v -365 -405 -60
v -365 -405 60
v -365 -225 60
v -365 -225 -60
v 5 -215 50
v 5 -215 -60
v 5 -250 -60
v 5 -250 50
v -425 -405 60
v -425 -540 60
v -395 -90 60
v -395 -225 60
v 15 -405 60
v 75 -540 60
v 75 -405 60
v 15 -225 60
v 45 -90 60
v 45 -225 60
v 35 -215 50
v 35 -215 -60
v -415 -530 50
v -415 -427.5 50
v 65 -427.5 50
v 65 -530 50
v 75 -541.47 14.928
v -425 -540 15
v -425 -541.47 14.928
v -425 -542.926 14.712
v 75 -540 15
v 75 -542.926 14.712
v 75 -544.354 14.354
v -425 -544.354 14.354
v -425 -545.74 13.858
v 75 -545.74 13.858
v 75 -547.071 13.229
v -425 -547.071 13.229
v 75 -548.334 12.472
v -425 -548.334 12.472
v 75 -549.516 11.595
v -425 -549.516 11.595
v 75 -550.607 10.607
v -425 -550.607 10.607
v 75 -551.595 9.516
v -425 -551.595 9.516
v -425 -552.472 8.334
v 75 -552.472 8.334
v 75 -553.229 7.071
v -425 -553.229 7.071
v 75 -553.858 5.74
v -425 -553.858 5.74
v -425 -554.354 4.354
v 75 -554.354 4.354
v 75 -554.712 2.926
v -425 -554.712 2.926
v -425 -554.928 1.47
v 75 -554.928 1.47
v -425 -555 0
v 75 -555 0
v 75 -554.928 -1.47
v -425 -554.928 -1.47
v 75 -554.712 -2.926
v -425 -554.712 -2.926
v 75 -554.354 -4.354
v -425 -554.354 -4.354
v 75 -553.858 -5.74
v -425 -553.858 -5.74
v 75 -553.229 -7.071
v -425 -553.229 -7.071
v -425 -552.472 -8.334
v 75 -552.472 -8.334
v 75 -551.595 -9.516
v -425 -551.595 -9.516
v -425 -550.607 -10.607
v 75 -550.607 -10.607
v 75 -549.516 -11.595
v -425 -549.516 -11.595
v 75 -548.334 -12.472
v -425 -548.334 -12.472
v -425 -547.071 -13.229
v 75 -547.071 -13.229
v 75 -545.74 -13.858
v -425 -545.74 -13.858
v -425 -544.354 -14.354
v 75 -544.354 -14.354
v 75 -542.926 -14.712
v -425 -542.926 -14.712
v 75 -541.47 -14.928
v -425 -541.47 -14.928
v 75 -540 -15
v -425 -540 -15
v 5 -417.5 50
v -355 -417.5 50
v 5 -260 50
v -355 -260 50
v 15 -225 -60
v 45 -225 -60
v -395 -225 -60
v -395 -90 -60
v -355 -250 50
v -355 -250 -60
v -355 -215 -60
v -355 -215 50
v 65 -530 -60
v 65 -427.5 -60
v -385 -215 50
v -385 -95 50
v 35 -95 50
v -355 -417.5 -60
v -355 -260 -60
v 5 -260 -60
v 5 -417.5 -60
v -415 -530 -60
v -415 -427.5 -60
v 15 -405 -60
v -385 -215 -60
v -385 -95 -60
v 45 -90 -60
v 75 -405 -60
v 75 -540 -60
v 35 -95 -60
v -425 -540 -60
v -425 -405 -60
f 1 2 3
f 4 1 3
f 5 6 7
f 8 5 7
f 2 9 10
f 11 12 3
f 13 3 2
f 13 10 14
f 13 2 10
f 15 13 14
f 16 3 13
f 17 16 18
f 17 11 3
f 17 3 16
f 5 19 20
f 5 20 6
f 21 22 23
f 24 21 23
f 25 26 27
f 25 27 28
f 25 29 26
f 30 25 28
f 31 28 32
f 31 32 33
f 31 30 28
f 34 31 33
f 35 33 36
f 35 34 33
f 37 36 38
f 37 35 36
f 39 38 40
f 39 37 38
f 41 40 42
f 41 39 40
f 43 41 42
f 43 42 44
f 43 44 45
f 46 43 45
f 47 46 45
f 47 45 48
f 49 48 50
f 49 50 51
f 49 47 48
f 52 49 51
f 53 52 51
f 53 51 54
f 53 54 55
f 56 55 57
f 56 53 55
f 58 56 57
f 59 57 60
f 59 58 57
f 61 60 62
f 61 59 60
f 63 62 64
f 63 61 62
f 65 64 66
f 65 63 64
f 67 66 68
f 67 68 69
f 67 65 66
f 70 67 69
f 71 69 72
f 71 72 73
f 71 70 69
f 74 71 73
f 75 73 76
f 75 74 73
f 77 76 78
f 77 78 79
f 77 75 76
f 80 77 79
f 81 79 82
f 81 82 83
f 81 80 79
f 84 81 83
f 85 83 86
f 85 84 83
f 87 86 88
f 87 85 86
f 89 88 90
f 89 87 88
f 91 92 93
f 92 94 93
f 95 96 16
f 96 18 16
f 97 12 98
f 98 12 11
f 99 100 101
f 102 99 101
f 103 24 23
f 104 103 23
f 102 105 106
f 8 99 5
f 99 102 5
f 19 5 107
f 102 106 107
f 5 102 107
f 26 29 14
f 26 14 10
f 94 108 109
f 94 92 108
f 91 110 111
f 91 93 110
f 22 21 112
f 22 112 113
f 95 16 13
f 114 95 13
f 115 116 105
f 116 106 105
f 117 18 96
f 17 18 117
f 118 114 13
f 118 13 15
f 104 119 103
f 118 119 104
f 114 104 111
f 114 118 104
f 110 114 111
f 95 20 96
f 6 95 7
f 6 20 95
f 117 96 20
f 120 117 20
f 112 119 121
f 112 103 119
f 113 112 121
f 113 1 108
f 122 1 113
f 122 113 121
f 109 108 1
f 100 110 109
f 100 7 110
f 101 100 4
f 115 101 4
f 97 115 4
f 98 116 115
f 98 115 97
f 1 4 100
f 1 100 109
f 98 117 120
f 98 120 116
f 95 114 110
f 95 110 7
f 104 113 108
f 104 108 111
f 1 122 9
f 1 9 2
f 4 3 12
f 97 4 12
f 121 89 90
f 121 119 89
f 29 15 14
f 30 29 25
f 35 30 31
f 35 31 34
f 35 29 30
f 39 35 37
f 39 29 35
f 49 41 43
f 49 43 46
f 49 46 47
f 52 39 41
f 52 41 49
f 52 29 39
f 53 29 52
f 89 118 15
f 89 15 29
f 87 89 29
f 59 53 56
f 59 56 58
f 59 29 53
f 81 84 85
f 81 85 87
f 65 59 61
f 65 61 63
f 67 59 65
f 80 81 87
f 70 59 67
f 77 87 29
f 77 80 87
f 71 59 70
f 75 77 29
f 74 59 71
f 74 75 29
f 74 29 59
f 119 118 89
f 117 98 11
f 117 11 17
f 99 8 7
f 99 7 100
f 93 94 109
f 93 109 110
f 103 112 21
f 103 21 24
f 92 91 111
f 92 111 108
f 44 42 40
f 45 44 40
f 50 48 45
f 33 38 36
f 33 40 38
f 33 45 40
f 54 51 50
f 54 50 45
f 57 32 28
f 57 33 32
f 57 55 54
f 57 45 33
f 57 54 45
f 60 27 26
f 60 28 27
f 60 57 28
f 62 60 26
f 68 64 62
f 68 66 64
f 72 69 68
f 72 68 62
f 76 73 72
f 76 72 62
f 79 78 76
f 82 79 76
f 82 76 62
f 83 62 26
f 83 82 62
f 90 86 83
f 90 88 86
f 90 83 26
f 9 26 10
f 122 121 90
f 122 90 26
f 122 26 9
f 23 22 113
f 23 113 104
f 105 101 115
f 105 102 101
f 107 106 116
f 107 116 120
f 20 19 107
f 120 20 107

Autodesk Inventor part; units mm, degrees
ref_plane "YZ Plane" through (0, 0, 0) normal (1, 0, 0) x (0, 1, 0)
ref_plane "XZ Plane" through (0, 0, 0) normal (0, 1, 0) x (-1, 0, 0)
ref_plane "XY Plane" through (0, 0, 0) normal (0, 0, 1) x (1, 0, 0)
ref_plane "РабПлоскость1" through (519.783, -178.5074, 484.3845) normal (-0.0032, 1, 0.0035) x (-0.0024, 0.0035, -1)
sketch "Эскиз1" plane through (0, 0, 0) normal (0, 0, 1) x (-1, 0, 0)
  line L0 (0, 0) -> (0, 90)
  line L1 (0, 90) -> (-25, 90)
  line L2 (-25, 90) -> (-75, 90)
  line L3 (-75, 90) -> (-75, 540)
  line L4 (-75, 540) -> (425, 540)
  line L5 (425, 540) -> (425, 90)
  line L6 (425, 90) -> (-75, 90)
  line L7 (175, 315) -> (425, 315)
  line L8 (175, 315) -> (-75, 315)
  line L9 (425, 315) -> (425, 405)
  line L10 (425, 405) -> (365, 405)
  line L11 (365, 405) -> (365, 225)
  line L12 (365, 225) -> (425, 225)
  line L13 (-75, 315) -> (-75, 405)
  line L14 (-75, 405) -> (-15, 405)
  line L15 (-15, 405) -> (-15, 225)
  line L16 (-15, 225) -> (-75, 225)
  line L17 (0, 90) -> (0, 100)
  line L18 (0, 100) -> (-65, 100)
  line L19 (0, 100) -> (415, 100)
  line L20 (425, 540) -> (415, 540)
  line L21 (415, 530) -> (415, 100)
  line L22 (425, 540) -> (425, 530)
  line L23 (415, 530) -> (-65, 530)
  line L24 (-75, 540) -> (-65, 540)
  line L25 (-65, 530) -> (-65, 100)
  point P0 (415, 405)
  point P1 (-65, 405)
  point P2 (-65, 225)
  point P3 (415, 225)
  dimension "d0" = 90
  dimension "d1" = 25
  dimension "d2" = 50
  dimension "d3" = 450
  dimension "d4" = 500
  dimension "d5" = 90
  dimension "d6" = 60
  dimension "d7" = 180
  dimension "d8" = 60
  dimension "d35" = 10
  dimension "d36" = 10
  dimension "d37" = 10
ref_plane "РабПлоскость2" through (0, 0, 60) normal (0, 0, 1) x (1, 0, 0)
extrude "Выдавливание6" add sketch "Эскиз1" along normal mid plane 120 contours L17 L19 L21 L12 L5 L6 | L1 L2 L3 L16 L25 L18 L17 | L10 L21 L23 L25 L14 L3 L4 L5
sketch "Эскиз7" plane through (0, 0, 60) normal (0, 0, 1) x (1, 0, 0)
  line L0 (-415, -100) -> (65, -100) projected
  line L1 (-415, -100) -> (65, -100)
  line L2 (65, -225) -> (75, -225) projected
  line L3 (65, -100) -> (65, -225)
  line L4 (65, -225) -> (15, -225)
  line L5 (15, -225) -> (15, -405)
  line L6 (15, -405) -> (65, -405)
  line L7 (-415, -530) -> (65, -530) projected
  line L8 (65, -405) -> (65, -530)
  line L9 (65, -530) -> (-415, -530)
  line L10 (-415, -530) -> (-415, -405)
  line L11 (-415, -225) -> (-415, -100)
  line L12 (-415, -405) -> (-365, -405)
  line L13 (-365, -405) -> (-365, -225)
  line L14 (-365, -225) -> (-415, -225)
  point P0 (0, 0)
  dimension "d40" = 50
  dimension "d41" = 180
  dimension "d43" = 50
extrude "Выдавливание7" add sketch "Эскиз7" against normal blind 10
sketch "Эскиз8" plane through (0, 0, 50) normal (0, 0, -1) x (-1, 0, 0)
  line L0 (415, -405) -> (415, -530) projected
  line L1 (365, -225) -> (365, -405) projected
  line L2 (415, -405) -> (365, -405)
  line L3 (365, -405) -> (365, -225)
  line L4 (415, -100) -> (415, -225) projected
  line L5 (365, -225) -> (415, -225)
  line L6 (415, -225) -> (415, -220)
  line L7 (415, -220) -> (355, -220)
  line L8 (355, -220) -> (355, -410)
  line L9 (355, -410) -> (415, -410)
  line L10 (415, -410) -> (415, -405)
  line L11 (425, -405) -> (425, -540) projected
  line L12 (-65, -225) -> (-65, -100) projected
  line L13 (-65, -225) -> (-15, -225) projected
  line L14 (-65, -225) -> (-15, -225)
  line L15 (-15, -225) -> (-15, -405)
  line L16 (-15, -405) -> (-65, -405)
  line L17 (-65, -405) -> (-65, -410)
  line L18 (-65, -410) -> (-5, -410)
  line L19 (-5, -410) -> (-5, -220)
  line L20 (-5, -220) -> (-65, -220)
  point P0 (0, 0)
  dimension "d46" = 5
  dimension "d47" = 60
  dimension "d48" = 190
  dimension "d49" = 5
  dimension "d50" = 60
  dimension "d51" = 190
extrude "Выдавливание8" add sketch "Эскиз8" along normal blind 110
sketch "Эскиз9" plane through (0, 0, 50) normal (0, 0, -1) x (-1, 0, 0)
  line L0 (415, -100) -> (415, -220) projected
  line L1 (415, -100) -> (415, -95)
  line L2 (415, -95) -> (-65, -95)
  line L3 (-65, -220) -> (-65, -100) projected
  line L4 (-65, -95) -> (-65, -100)
  line L5 (-65, -100) -> (415, -100)
  point P0 (0, 0)
  dimension "d54" = 5
extrude "Выдавливание9" cut sketch "Эскиз9" along normal blind 110
sketch "Эскиз10" plane through (0, 0, 50) normal (0, 0, -1) x (-1, 0, 0)
  line L0 (415, -410) -> (415, -427.5)
  line L1 (415, -410) -> (415, -530) projected
  line L2 (415, -427.5) -> (-65, -427.5)
  line L3 (-65, -530) -> (-65, -410) projected
  line L4 (-65, -427.5) -> (-65, -410)
  line L5 (-5, -410) -> (-5, -220) projected
  line L6 (-65, -410) -> (-5, -410)
  line L7 (-5, -410) -> (-5, -417.5)
  line L8 (-5, -417.5) -> (355, -417.5)
  line L9 (355, -410) -> (415, -410) projected
  line L10 (355, -417.5) -> (355, -410)
  line L11 (355, -410) -> (415, -410)
  point P0 (0, 0)
  dimension "d57" = 17.5
  dimension "d58" = 480
  dimension "d59" = 7.5
extrude "Выдавливание10" add sketch "Эскиз10" along normal blind 110
sketch "Эскиз11" plane through (0, 0, 50) normal (0, 0, -1) x (-1, 0, 0)
  line L0 (355, -220) -> (355, -417.5) projected
  line L1 (355, -220) -> (355, -260)
  line L2 (355, -260) -> (-5, -260)
  line L3 (-5, -220) -> (-5, -417.5) projected
  line L4 (-5, -260) -> (-5, -250)
  line L5 (-5, -250) -> (355, -250)
  point P0 (0, 0)
  dimension "d62" = 40
  dimension "d63" = 10
extrude "Выдавливание11" add sketch "Эскиз11" along normal blind 110
sketch "Эскиз12" plane through (0, 0, 60) normal (0, 0, 1) x (1, 0, 0)
  line L0 (15, -225) -> (75, -225) projected
  line L1 (75, -90) -> (-425, -90) projected
  line L2 (75, -225) -> (45, -225)
  line L3 (45, -225) -> (45, -90)
  line L4 (45, -90) -> (75, -90)
  line L5 (75, -90) -> (75, -225)
  line L6 (-425, -225) -> (-365, -225) projected
  line L7 (-425, -225) -> (-395, -225)
  line L8 (-395, -225) -> (-395, -90)
  line L9 (-395, -90) -> (-425, -90)
  line L10 (-425, -90) -> (-425, -225)
  point P0 (0, 0)
  dimension "d66" = 30
extrude "Выдавливание12" cut sketch "Эскиз12" against normal blind 120
sketch "Эскиз13" plane through (0, 0, 50) normal (0, 0, -1) x (-1, 0, 0)
  line L0 (-45, -95) -> (-45, -220) projected
  line L1 (395, -95) -> (-45, -95) projected
  line L2 (-45, -220) -> (-35, -220)
  line L3 (-35, -220) -> (-35, -95)
  line L4 (-35, -95) -> (-45, -95)
  line L5 (-45, -95) -> (-45, -220)
  line L6 (395, -95) -> (385, -95)
  line L7 (385, -95) -> (385, -220)
  line L8 (385, -220) -> (395, -220)
  line L9 (395, -220) -> (395, -95)
  point P0 (0, 0)
  dimension "d69" = 10
  dimension "d70" = 10
extrude "Выдавливание13" add sketch "Эскиз13" along normal blind 110
sketch "Эскиз14" plane through (0, 0, -60) normal (0, 0, -1) x (-1, 0, 0)
  point P0 (0, 0)
sketch "Эскиз15" plane through (75, -540, 60) normal (1, 0, 0) x (0, 0, -1)
  line L0 (0, 135) -> (0, 0) projected
  line L1 (120, 0) -> (120, 135) projected
  line L2 (0, 0) -> (120, 0)
  line L3 (120, 0) -> (60, 0)
  arc A0 (45, 0) -> (75, 0) centre (60, 0) ccw
  point P0 (60, 540)
  dimension "d73" = 60
  dimension "d74" = 30
extrude "Выдавливание14" add sketch "Эскиз15" against normal blind 500
sketch "Эскиз16" plane through (0, 0, 50) normal (0, 0, -1) x (-1, 0, 0)
  line L0 (-35, -220) -> (-35, -95) projected
  line L1 (-35, -220) -> (-35, -215)
  line L2 (-35, -215) -> (-5, -215)
  line L3 (-5, -220) -> (-35, -220) projected
  line L4 (-5, -215) -> (-5, -220)
  line L5 (-5, -220) -> (-35, -220)
  line L6 (385, -220) -> (355, -220) projected
  line L7 (355, -220) -> (355, -215)
  line L8 (355, -215) -> (385, -215)
  line L9 (385, -95) -> (385, -220) projected
  line L10 (385, -215) -> (385, -220)
  line L11 (355, -220) -> (385, -220)
  point P0 (0, 0)
  dimension "d77" = 5
extrude "Выдавливание15" add sketch "Эскиз16" along normal blind 110
properties part number "ОсноваКорпуса" material "Титан"
